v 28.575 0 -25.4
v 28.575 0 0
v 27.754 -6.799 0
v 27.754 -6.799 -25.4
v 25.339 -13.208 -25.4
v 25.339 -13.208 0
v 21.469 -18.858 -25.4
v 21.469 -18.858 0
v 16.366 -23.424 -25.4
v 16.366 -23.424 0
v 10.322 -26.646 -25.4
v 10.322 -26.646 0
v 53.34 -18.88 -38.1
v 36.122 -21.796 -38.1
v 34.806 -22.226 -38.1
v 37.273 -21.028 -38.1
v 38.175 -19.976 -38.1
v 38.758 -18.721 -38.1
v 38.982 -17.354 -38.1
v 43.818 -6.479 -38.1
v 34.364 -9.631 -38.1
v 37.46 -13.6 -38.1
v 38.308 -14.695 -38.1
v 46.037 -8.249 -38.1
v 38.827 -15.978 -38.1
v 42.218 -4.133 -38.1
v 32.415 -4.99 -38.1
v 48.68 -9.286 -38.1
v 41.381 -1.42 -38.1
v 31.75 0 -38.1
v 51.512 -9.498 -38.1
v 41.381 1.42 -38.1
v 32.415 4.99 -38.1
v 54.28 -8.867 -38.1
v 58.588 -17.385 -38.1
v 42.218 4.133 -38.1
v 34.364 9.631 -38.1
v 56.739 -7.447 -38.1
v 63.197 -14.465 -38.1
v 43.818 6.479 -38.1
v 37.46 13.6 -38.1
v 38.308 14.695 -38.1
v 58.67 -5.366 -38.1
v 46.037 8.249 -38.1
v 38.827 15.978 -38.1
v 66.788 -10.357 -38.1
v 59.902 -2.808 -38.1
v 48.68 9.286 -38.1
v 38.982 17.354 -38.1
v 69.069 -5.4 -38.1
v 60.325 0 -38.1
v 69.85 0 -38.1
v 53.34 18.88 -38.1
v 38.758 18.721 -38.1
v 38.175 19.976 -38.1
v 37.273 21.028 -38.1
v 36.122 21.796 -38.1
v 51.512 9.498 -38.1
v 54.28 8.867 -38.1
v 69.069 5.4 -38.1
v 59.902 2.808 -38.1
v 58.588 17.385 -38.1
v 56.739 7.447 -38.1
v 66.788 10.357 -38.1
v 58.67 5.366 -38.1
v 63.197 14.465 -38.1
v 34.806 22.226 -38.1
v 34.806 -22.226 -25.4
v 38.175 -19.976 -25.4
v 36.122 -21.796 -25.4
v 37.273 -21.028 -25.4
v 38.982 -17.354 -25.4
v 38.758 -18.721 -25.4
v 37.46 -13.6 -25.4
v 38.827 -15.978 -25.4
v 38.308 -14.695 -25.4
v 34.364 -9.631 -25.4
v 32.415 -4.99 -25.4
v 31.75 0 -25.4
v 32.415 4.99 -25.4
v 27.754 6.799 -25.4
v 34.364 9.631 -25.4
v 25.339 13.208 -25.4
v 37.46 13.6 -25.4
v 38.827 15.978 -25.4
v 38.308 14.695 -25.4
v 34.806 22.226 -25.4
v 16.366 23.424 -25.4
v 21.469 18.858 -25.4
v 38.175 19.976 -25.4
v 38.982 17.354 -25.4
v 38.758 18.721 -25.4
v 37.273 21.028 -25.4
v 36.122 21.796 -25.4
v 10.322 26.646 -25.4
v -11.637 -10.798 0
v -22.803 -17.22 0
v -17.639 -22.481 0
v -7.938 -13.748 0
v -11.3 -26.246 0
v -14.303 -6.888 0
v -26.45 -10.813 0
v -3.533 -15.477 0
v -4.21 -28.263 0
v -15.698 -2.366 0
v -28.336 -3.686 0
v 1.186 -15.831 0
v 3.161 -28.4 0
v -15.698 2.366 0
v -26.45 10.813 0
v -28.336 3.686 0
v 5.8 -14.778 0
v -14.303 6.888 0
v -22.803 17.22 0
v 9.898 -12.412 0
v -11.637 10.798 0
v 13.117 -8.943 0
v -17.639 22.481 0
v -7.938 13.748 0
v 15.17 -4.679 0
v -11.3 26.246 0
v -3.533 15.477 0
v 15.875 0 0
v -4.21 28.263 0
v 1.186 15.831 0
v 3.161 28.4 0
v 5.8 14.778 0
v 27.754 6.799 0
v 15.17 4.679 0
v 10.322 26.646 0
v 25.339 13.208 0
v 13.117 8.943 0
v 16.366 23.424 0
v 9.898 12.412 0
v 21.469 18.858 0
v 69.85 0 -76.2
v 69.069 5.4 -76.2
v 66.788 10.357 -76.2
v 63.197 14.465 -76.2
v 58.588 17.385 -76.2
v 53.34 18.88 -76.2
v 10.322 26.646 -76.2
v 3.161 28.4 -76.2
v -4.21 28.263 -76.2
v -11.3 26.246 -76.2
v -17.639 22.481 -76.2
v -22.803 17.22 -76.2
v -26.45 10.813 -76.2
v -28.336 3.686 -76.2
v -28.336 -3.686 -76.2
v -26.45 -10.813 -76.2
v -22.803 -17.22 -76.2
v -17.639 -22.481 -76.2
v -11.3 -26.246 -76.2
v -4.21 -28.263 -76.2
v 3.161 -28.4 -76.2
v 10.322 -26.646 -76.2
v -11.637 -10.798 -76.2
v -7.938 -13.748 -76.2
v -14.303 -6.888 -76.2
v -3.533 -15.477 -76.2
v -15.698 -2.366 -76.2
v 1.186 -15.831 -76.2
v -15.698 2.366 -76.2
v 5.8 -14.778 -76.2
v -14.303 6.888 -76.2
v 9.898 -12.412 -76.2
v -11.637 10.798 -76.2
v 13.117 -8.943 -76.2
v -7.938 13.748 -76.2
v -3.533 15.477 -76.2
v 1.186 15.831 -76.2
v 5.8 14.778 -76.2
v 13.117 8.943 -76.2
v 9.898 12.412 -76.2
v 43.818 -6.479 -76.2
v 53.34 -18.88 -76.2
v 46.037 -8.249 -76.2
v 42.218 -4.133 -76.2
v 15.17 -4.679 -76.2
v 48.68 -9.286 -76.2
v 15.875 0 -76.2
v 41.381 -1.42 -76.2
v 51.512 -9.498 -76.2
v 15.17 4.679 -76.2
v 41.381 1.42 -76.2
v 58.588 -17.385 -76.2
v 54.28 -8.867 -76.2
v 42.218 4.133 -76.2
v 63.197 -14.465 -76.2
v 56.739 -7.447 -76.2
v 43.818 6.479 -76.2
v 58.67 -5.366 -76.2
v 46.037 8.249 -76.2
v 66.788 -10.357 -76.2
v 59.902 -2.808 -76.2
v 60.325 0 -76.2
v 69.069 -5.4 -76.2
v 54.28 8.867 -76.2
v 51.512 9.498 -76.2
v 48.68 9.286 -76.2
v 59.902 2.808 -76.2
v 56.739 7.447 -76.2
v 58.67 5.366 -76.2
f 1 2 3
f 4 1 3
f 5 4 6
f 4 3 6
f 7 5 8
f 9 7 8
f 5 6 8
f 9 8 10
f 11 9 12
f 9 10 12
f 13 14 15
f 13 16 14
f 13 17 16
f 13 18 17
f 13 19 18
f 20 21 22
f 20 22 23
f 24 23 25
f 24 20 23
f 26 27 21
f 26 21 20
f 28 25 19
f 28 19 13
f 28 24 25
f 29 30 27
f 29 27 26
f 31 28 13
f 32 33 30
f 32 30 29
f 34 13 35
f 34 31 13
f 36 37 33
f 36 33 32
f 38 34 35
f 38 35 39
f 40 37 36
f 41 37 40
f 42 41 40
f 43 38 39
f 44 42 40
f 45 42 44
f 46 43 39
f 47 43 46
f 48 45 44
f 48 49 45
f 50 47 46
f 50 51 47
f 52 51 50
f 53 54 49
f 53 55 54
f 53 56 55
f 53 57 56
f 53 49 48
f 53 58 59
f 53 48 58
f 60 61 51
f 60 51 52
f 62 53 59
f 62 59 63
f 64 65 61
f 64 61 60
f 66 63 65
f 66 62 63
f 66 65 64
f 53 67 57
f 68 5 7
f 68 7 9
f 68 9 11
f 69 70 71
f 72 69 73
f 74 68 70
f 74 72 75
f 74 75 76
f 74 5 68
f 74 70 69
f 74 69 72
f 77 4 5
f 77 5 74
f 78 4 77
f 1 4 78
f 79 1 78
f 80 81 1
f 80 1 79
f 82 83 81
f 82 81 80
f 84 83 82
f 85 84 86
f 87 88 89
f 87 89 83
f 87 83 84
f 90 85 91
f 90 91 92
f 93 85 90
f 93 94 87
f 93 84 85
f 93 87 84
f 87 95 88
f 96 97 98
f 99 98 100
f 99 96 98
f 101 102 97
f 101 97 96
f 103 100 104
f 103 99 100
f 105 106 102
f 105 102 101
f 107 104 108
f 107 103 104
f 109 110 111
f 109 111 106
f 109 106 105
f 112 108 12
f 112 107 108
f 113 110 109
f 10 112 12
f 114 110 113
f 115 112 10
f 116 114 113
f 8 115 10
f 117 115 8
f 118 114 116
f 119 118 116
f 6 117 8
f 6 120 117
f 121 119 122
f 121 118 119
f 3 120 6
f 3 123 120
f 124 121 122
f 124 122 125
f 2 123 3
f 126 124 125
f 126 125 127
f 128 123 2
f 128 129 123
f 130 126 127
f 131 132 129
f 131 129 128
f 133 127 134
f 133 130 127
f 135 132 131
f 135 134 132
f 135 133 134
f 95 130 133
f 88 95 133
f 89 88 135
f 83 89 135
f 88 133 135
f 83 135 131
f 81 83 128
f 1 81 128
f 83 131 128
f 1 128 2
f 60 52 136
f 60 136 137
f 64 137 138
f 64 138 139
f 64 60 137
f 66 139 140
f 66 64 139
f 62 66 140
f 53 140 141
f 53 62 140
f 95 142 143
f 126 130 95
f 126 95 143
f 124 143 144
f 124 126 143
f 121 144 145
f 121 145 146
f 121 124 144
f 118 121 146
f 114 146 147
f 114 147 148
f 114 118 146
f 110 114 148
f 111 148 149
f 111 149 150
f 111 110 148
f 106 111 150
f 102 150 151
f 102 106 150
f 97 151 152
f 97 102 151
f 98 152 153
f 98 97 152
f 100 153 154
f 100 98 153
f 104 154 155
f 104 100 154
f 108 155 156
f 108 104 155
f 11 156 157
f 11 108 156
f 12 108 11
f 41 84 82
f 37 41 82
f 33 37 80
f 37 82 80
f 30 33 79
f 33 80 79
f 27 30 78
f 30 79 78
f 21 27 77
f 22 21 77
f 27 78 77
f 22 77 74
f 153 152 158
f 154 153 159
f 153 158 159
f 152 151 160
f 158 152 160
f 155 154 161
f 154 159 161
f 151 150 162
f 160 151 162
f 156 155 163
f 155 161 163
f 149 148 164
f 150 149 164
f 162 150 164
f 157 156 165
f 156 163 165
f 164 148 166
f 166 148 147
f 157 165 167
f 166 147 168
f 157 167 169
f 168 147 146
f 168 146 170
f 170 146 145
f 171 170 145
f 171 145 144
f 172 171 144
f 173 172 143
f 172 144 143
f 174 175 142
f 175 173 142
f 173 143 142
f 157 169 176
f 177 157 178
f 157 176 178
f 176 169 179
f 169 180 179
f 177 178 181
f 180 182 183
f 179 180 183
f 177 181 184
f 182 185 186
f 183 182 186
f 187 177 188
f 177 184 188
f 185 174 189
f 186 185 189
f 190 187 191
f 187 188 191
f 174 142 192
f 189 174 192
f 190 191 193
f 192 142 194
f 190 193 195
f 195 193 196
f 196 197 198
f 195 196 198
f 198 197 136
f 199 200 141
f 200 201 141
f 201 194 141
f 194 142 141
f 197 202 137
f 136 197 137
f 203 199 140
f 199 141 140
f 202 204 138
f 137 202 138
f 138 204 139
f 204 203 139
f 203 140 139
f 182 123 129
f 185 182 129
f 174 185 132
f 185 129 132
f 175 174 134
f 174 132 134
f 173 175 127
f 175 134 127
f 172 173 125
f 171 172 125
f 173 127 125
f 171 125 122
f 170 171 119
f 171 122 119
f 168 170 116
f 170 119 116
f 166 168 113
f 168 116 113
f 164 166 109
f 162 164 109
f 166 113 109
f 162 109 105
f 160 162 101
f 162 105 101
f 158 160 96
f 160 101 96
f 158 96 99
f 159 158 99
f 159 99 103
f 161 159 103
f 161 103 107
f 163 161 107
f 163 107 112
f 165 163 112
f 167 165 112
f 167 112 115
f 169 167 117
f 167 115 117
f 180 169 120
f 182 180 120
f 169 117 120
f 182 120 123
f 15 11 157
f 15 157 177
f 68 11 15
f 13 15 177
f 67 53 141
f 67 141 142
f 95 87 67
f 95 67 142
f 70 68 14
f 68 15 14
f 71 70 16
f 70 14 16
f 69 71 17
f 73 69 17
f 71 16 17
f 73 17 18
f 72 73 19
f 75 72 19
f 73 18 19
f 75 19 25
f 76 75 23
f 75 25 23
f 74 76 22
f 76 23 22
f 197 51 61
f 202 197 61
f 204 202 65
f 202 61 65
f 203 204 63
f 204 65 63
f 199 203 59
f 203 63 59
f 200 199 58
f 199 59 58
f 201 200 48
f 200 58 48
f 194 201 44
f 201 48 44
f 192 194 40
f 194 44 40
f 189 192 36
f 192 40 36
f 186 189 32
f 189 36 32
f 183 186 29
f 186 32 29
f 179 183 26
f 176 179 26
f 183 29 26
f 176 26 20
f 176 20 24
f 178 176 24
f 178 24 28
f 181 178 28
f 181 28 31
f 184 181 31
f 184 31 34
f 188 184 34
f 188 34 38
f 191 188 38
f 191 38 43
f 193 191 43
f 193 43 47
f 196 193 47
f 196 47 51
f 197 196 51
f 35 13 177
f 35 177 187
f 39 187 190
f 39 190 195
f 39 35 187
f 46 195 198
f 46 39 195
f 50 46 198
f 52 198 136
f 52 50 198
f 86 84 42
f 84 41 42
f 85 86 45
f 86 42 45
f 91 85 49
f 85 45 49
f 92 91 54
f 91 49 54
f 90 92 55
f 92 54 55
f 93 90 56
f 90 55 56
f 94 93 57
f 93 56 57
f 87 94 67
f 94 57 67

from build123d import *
from build123d import SkipClean  # not in build123d's __all__

# Parameters (mm, degrees)
F0_R     = 15.875
F0_R_2   = 9.525
F1_DEPTH = 76.2
F2_DEPTH = 38.1
F3_DEPTH = 25.4
F4_R     = 5.08


with BuildPart() as f1:
    # F0 (on Top) → F1 (new body)
    with BuildSketch(Plane.XY):
        with BuildLine():
            ThreePointArc((10.3219202517, 26.6456110329), (23.5741330296, 16.1490209271), (28.575, 0))
            ThreePointArc((28.575, 0), (23.5741330296, -16.1490209271), (10.3219202517, -26.6456110329))
            Line((10.3219202517, -26.6456110329), (53.34, -18.8799073091))
            ThreePointArc((53.34, -18.8799073091), (31.75, 0), (53.34, 18.8799073091))
            Line((53.34, 18.8799073091), (10.3219202517, 26.6456110329))
        make_face()
        with BuildLine():
            ThreePointArc((10.3219202517, -26.6456110329), (23.5741330296, -16.1490209271), (28.575, 0))
            ThreePointArc((28.575, 0), (23.5741330296, 16.1490209271), (10.3219202517, 26.6456110329))
            ThreePointArc((10.3219202517, 26.6456110329), (-28.575, 0), (10.3219202517, -26.6456110329))
        make_face()
        Circle(F0_R, mode=Mode.SUBTRACT)
        with BuildLine():
            ThreePointArc((69.85, 0), (65.1403190341, 12.5402452129), (53.34, 18.8799073091))
            ThreePointArc((53.34, 18.8799073091), (31.75, 0), (53.34, -18.8799073091))
            ThreePointArc((53.34, -18.8799073091), (65.1403190341, -12.5402452129), (69.85, 0))
        make_face()
        with Locations((50.8, 0)):
            Circle(F0_R_2, mode=Mode.SUBTRACT)
    extrude(amount=-F1_DEPTH)

    # F0 (on Top) → F2 (cut)
    with BuildSketch(Plane.XY):
        with BuildLine():
            ThreePointArc((69.85, 0), (65.1403190341, 12.5402452129), (53.34, 18.8799073091))
            ThreePointArc((53.34, 18.8799073091), (31.75, 0), (53.34, -18.8799073091))
            ThreePointArc((53.34, -18.8799073091), (65.1403190341, -12.5402452129), (69.85, 0))
        make_face()
        with Locations((50.8, 0)):
            Circle(F0_R_2, mode=Mode.SUBTRACT)
    extrude(amount=-F2_DEPTH, mode=Mode.SUBTRACT)

    # F0 (on Top) → F3 (cut)
    with BuildSketch(Plane.XY):
        with BuildLine():
            ThreePointArc((10.3219202517, 26.6456110329), (23.5741330296, 16.1490209271), (28.575, 0))
            ThreePointArc((28.575, 0), (23.5741330296, -16.1490209271), (10.3219202517, -26.6456110329))
            Line((10.3219202517, -26.6456110329), (53.34, -18.8799073091))
            ThreePointArc((53.34, -18.8799073091), (31.75, 0), (53.34, 18.8799073091))
            Line((53.34, 18.8799073091), (10.3219202517, 26.6456110329))
        make_face()
    with SkipClean():  # cleaning this boolean's faces spoils the solid; the shape is the same uncleaned
        extrude(amount=-F3_DEPTH, mode=Mode.SUBTRACT)

    # F4
    f4_edges = [f1.edges().sort_by_distance(p)[0] for p in [
        (53.34, -18.879907, -31.75),
        (53.34, -18.879907, -57.15),
        (53.34, 18.879907, -31.75),
        (53.34, 18.879907, -57.15),
    ]]
    fillet(f4_edges, radius=F4_R)


solid = f1.part
